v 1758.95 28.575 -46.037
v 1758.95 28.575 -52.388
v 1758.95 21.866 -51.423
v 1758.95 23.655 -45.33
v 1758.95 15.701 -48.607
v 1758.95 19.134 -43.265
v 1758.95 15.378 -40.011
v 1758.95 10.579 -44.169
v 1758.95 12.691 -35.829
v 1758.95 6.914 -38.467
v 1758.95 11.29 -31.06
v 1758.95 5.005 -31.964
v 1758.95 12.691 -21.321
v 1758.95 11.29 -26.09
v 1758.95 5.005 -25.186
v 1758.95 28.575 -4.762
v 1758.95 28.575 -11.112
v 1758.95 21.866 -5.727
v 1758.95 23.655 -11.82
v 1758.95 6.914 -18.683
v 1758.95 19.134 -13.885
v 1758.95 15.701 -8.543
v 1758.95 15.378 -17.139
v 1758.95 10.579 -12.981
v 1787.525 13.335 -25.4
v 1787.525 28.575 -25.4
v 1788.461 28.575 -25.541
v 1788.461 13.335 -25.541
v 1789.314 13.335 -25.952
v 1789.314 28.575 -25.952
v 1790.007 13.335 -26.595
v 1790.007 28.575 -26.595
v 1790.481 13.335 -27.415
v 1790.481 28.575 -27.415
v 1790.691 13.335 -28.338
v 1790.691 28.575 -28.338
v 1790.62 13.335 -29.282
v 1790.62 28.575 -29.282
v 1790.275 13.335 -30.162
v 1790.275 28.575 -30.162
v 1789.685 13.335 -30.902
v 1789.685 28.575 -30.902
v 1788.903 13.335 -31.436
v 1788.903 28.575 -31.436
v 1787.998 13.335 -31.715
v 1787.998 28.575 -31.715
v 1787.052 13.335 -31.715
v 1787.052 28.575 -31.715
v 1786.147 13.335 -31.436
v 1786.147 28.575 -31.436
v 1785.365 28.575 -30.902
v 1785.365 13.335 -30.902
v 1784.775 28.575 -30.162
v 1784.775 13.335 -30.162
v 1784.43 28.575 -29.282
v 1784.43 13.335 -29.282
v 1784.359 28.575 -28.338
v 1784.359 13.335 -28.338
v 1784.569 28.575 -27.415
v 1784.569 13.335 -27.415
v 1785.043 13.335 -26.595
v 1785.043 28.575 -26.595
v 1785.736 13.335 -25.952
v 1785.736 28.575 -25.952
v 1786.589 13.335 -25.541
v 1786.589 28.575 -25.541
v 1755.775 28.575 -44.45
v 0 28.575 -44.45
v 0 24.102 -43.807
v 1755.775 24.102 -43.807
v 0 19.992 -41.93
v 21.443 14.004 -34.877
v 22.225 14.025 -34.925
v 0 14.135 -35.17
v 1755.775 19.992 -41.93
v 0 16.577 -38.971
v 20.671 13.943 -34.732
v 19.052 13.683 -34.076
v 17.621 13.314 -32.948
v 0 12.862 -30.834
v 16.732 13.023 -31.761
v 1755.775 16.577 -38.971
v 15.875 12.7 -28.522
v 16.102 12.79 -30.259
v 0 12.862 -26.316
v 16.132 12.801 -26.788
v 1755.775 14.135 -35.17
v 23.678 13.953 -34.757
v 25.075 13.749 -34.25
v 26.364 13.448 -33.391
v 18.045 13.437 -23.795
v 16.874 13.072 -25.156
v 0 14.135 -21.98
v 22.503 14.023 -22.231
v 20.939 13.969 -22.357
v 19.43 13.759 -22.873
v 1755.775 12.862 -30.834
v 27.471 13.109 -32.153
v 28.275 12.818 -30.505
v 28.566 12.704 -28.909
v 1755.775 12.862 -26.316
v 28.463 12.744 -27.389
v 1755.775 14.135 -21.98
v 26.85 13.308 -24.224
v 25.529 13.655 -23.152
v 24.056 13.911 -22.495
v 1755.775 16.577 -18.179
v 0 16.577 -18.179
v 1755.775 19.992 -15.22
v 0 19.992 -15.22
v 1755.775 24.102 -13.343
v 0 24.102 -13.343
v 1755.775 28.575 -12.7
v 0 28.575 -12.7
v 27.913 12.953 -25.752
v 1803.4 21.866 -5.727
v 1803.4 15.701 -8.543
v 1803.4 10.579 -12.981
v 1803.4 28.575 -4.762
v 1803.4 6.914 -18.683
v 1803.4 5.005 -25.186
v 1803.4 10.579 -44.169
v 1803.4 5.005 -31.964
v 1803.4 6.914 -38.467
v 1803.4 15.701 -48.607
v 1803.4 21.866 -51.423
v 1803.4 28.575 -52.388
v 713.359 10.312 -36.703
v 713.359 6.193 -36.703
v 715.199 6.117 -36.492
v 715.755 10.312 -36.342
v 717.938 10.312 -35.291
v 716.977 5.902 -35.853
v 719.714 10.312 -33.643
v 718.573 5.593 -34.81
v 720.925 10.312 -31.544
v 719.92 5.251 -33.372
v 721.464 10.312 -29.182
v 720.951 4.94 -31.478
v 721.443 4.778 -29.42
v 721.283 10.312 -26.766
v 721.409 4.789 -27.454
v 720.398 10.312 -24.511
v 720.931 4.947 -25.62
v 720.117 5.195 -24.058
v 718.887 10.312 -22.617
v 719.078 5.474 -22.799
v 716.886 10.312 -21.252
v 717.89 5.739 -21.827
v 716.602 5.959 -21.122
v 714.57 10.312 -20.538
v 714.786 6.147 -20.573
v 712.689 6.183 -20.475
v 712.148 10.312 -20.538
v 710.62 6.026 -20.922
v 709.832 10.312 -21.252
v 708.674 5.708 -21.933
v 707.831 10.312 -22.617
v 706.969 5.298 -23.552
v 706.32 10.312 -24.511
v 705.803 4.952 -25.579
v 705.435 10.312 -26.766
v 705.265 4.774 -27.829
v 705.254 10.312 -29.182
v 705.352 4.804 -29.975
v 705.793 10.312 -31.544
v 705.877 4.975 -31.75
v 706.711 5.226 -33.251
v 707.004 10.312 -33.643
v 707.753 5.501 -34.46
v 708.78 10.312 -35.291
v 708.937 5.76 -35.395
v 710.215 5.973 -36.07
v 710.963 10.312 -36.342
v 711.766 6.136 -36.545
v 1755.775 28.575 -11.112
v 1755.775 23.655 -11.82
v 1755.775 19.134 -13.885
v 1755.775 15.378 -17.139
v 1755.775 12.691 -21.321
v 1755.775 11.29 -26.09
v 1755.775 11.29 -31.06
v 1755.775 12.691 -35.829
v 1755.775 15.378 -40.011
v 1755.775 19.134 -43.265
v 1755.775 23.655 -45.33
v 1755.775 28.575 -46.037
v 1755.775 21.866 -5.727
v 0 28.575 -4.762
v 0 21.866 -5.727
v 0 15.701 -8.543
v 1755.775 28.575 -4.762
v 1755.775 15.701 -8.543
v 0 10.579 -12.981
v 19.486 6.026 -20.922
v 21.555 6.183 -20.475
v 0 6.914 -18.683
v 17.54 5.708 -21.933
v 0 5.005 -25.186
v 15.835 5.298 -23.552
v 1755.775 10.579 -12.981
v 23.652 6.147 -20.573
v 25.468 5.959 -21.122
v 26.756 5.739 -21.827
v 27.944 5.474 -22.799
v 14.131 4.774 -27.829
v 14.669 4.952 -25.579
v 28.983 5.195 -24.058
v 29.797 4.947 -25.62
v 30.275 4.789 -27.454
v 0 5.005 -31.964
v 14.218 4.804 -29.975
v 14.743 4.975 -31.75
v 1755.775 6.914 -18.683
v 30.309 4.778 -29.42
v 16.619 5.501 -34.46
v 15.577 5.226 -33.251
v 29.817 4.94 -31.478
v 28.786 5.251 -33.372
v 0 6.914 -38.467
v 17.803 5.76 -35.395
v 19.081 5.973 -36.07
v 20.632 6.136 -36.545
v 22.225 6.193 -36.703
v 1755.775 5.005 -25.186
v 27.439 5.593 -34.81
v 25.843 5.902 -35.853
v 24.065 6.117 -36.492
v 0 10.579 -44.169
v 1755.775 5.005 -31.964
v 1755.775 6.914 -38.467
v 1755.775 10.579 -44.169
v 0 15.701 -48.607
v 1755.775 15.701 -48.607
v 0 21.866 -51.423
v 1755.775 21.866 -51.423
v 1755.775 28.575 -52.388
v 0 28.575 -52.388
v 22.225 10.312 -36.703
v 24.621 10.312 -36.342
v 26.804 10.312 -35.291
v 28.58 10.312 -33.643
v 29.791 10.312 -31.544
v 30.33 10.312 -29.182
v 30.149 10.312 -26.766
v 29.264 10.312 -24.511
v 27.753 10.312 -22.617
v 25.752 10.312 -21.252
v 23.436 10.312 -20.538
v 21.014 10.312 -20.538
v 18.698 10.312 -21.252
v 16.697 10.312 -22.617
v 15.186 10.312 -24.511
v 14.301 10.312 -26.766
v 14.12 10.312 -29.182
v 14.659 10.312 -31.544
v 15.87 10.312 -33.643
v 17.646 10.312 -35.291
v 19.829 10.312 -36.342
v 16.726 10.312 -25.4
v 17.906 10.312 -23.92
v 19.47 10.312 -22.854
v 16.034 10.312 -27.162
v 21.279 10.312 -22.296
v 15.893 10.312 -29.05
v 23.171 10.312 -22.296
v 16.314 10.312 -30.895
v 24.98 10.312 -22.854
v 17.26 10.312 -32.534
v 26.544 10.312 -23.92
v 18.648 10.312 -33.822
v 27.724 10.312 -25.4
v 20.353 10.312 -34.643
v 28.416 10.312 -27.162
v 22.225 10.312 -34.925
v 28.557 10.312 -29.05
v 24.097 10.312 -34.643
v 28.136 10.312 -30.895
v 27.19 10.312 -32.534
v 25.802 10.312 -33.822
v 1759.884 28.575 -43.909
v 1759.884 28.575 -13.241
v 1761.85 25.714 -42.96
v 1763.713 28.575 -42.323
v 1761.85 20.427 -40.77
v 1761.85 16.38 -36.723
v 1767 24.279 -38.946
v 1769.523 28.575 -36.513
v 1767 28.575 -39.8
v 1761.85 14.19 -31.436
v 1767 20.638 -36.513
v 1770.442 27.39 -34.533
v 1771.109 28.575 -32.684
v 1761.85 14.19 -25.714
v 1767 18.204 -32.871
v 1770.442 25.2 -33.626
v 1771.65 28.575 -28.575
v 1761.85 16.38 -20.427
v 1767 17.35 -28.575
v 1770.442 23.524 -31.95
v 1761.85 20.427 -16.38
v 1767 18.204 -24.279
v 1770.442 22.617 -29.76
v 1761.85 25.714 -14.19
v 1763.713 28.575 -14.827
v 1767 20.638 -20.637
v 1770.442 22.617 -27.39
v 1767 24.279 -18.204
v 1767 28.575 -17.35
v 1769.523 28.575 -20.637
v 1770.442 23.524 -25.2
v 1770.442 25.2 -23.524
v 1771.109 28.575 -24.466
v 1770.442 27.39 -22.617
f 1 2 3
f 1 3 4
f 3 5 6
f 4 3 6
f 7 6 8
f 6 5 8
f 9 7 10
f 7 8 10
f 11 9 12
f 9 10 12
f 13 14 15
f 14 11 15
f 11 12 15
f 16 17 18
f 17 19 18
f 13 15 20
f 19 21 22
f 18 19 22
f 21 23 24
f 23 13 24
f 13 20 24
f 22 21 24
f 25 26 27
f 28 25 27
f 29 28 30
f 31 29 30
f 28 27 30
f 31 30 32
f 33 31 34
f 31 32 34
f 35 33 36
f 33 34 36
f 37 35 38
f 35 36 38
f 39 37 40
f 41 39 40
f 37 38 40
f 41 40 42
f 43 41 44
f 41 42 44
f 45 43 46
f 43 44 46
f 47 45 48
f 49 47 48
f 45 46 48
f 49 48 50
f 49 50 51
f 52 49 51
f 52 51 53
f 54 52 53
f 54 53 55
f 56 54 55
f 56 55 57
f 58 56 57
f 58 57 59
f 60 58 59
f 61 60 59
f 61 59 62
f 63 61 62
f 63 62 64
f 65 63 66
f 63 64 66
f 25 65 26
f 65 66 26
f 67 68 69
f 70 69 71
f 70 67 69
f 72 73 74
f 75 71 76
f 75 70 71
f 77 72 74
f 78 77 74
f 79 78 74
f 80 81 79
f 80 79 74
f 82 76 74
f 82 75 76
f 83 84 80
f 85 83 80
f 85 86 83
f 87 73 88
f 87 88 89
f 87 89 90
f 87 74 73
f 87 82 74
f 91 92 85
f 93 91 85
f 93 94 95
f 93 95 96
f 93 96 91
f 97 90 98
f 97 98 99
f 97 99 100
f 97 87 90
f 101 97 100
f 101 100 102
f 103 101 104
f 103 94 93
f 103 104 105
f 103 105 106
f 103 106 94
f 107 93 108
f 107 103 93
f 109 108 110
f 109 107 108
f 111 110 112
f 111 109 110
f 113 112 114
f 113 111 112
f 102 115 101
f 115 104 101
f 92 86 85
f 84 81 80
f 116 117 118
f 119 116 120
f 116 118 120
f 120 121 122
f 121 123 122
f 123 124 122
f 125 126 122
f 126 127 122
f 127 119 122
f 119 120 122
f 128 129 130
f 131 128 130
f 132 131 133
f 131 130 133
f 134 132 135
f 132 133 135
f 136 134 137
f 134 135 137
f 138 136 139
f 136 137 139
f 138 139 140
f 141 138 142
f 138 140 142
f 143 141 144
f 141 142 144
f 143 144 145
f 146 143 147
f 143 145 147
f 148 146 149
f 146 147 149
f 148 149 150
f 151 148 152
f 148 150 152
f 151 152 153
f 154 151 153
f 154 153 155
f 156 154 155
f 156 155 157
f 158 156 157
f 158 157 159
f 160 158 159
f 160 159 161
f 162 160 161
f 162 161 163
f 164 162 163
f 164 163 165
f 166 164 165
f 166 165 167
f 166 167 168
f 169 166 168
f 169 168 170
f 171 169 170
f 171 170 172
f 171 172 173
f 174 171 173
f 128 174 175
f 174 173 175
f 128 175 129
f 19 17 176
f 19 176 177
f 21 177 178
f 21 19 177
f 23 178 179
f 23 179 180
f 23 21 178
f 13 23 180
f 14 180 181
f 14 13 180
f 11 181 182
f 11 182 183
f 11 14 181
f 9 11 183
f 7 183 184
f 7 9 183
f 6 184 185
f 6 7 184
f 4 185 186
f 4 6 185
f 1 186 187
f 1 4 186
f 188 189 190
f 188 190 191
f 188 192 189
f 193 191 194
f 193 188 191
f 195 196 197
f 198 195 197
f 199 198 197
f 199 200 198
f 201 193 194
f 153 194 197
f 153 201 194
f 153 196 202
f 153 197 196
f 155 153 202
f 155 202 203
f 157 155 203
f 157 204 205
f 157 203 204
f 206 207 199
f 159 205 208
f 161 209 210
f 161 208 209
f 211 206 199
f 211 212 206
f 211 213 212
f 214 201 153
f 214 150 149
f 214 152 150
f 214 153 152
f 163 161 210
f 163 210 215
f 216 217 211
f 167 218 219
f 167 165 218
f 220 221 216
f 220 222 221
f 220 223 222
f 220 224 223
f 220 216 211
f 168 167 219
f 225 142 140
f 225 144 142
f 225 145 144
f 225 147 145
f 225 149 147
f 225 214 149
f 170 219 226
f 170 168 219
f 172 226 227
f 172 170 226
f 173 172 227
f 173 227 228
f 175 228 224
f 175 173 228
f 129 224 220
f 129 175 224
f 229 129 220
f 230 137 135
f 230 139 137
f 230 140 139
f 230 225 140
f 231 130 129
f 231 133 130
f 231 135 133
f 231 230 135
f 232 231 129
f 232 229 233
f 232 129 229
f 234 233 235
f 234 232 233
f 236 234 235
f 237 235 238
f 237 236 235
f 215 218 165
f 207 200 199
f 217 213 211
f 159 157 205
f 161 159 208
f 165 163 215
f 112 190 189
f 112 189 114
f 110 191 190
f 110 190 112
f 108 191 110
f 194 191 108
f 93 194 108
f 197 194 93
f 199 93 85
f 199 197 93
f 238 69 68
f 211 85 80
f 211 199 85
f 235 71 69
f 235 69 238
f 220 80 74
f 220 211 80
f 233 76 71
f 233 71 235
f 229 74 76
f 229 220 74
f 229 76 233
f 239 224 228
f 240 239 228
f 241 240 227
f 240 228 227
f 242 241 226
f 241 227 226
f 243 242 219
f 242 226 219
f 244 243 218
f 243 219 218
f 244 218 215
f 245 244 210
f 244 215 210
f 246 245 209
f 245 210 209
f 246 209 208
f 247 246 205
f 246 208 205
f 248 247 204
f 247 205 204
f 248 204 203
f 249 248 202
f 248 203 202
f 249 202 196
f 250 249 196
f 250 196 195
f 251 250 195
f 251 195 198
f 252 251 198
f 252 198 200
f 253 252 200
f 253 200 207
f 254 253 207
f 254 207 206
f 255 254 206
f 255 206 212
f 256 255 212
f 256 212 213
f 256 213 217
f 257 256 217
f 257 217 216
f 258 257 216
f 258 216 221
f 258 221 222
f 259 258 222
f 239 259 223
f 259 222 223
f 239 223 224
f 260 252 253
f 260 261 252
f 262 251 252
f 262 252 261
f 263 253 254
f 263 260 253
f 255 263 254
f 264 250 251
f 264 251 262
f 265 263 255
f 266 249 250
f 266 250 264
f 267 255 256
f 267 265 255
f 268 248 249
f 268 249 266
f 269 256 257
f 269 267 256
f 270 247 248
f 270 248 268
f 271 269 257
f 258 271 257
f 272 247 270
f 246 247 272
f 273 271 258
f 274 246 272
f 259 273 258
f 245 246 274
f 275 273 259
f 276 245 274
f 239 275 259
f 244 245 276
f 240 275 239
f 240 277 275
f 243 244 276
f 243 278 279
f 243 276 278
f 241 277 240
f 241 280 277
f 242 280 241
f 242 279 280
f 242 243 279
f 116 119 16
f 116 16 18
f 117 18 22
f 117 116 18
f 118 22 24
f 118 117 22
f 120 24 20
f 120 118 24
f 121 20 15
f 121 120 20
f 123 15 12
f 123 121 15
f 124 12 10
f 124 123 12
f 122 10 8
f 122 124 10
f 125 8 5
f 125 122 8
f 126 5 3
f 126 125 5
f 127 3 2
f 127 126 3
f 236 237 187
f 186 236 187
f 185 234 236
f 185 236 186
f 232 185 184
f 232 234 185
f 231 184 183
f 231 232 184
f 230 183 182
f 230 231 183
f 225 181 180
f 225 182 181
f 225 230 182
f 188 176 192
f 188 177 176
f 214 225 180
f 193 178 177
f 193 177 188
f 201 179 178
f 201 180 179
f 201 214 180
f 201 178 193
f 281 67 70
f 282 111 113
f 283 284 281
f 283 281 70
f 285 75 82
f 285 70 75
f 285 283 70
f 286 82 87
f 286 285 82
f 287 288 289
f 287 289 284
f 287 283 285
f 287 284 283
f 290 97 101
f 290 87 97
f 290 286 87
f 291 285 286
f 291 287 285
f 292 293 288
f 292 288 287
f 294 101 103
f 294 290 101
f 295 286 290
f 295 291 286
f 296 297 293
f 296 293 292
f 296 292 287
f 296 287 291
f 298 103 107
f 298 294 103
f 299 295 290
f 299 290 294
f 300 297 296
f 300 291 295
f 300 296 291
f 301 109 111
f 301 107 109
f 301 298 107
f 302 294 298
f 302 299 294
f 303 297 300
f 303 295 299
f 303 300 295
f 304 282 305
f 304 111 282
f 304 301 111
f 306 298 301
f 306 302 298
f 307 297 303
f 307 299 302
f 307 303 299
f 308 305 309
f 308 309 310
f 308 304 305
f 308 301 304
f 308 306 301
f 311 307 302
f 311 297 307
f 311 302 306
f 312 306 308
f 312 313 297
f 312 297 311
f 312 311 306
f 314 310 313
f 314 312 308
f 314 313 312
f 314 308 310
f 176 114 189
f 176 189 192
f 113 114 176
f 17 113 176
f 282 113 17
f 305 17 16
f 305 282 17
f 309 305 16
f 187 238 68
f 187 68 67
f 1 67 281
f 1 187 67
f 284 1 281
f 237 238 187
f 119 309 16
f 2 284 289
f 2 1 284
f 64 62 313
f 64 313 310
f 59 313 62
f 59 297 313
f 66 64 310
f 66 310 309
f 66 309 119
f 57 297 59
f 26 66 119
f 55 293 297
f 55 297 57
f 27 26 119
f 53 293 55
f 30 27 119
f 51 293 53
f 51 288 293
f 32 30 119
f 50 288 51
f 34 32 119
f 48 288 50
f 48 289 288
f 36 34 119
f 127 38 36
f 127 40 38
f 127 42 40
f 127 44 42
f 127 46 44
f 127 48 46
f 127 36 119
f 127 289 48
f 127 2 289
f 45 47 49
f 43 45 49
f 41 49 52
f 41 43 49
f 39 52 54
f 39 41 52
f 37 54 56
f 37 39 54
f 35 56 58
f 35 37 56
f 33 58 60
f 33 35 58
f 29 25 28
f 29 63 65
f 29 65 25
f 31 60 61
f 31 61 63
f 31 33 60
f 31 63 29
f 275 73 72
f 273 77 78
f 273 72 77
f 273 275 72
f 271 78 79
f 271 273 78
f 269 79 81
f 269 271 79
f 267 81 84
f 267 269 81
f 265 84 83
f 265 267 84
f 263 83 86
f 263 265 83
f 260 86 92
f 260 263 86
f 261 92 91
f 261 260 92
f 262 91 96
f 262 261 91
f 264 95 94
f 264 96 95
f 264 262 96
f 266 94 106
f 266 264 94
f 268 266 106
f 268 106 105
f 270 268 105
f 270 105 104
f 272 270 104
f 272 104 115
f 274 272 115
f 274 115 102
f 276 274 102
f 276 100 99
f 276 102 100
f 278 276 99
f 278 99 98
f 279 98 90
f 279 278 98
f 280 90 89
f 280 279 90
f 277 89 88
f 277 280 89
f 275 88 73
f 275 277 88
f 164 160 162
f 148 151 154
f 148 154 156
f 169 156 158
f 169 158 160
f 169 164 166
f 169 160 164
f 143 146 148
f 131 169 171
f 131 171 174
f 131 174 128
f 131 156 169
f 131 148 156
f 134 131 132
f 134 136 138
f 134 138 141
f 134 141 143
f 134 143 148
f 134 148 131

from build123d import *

# Parameters (mm, degrees)
SKETCH1_W                     = 1803.4
SKETCH1_H                     = 57.15
WOOD_BLOCK_DEPTH              = 28.575
SKETCH5_R                     = 6.35
MOUTHPIECE_THROUGH_HOLE_DEPTH = 1805.531577204
SKETCH6_R                     = 3.175
DOWEL_PIN_HOLE_DEPTH          = 15.24
SKETCH8_R                     = 8.128
CUT_EXTRUDE1_DEPTH            = 10.3124
SKETCH3_OUTSIDE_W             = 420.056
SKETCH3_OUTSIDE_H             = 391.481
SKETCH3_OUTSIDE_R             = 23.8125
OUTER_DIAMETER_DEPTH          = 1805.531577305
SKETCH7_W                     = 3.175
SKETCH7_H                     = 6.35


with BuildPart() as part:
    # Sketch1 → wood block (new body)
    with BuildSketch(Plane(origin=(0, 0, 0), x_dir=(1, 0, 0), z_dir=(0, 1, 0))):
        with Locations((901.7, 28.575)):
            Rectangle(SKETCH1_W, SKETCH1_H)
    extrude(amount=WOOD_BLOCK_DEPTH)

    # Sketch2 → inner bore (revolve, cut)
    with BuildSketch(Plane.XY.offset(-28.575)):
        with BuildLine():
            Line((1771.65, 28.575), (-15.875, 28.575))
            ThreePointArc((-15.875, 28.575), (-11.225320151, 17.349679849), (0, 12.7))
            Line((0, 12.7), (1755.775, 12.7))
            ThreePointArc((1755.775, 12.7), (1767.000320151, 17.349679849), (1771.65, 28.575))
        make_face()
    revolve(axis=Axis((1771.65, 28.575, -28.575), (-1, 0, 0)), mode=Mode.SUBTRACT)

    # Sketch5 → mouthpiece through hole (cut, through all)
    with BuildSketch(Plane(origin=(0, 0, 0), x_dir=(1, 0, 0), z_dir=(0, 1, 0))):
        with Locations(Location((22.225, 28.575, 0), (0, 0, 90))):
            Circle(SKETCH5_R)
    extrude(amount=MOUTHPIECE_THROUGH_HOLE_DEPTH, mode=Mode.SUBTRACT)

    # Sketch6 → dowel pin hole (cut)
    with BuildSketch(Plane(origin=(0, 28.575, 0), x_dir=(1, 0, 0), z_dir=(0, 1, 0))):
        with Locations(Location((1787.525, 28.575, 0), (0, 0, 270))):
            Circle(SKETCH6_R)
    extrude(amount=-DOWEL_PIN_HOLE_DEPTH, mode=Mode.SUBTRACT)

    # Sketch8 → Cut-Extrude1 (cut)
    with BuildSketch(Plane.XZ):
        with Locations(Location((22.225, -28.575, 0), (0, 0, 270))):
            Circle(SKETCH8_R)
        with Locations(Location((713.359, -28.575, 0), (0, 0, 270))):
            Circle(SKETCH8_R)
    extrude(amount=-CUT_EXTRUDE1_DEPTH, mode=Mode.SUBTRACT)

    # Sketch3 outside → outer diameter (cut, through all)
    with BuildSketch(Plane(origin=(1803.4, 0, 0), x_dir=(0, 0, -1), z_dir=(1, 0, 0))):
        with Locations((28.575, 14.2875)):
            Rectangle(SKETCH3_OUTSIDE_W, SKETCH3_OUTSIDE_H)
        with Locations((28.575, 28.575)):
            Circle(SKETCH3_OUTSIDE_R, mode=Mode.SUBTRACT)
    extrude(amount=-OUTER_DIAMETER_DEPTH, mode=Mode.SUBTRACT)

    # Sketch7 → end length locator (revolve, cut)
    with BuildSketch(Plane(origin=(0, 28.575, 0), x_dir=(1, 0, 0), z_dir=(0, 1, 0))):
        with Locations((1757.3625, 7.9375)):
            Rectangle(SKETCH7_W, SKETCH7_H)
    revolve(axis=Axis((0, 28.575, -28.575), (1, 0, 0)), mode=Mode.SUBTRACT)


solid = part.part
